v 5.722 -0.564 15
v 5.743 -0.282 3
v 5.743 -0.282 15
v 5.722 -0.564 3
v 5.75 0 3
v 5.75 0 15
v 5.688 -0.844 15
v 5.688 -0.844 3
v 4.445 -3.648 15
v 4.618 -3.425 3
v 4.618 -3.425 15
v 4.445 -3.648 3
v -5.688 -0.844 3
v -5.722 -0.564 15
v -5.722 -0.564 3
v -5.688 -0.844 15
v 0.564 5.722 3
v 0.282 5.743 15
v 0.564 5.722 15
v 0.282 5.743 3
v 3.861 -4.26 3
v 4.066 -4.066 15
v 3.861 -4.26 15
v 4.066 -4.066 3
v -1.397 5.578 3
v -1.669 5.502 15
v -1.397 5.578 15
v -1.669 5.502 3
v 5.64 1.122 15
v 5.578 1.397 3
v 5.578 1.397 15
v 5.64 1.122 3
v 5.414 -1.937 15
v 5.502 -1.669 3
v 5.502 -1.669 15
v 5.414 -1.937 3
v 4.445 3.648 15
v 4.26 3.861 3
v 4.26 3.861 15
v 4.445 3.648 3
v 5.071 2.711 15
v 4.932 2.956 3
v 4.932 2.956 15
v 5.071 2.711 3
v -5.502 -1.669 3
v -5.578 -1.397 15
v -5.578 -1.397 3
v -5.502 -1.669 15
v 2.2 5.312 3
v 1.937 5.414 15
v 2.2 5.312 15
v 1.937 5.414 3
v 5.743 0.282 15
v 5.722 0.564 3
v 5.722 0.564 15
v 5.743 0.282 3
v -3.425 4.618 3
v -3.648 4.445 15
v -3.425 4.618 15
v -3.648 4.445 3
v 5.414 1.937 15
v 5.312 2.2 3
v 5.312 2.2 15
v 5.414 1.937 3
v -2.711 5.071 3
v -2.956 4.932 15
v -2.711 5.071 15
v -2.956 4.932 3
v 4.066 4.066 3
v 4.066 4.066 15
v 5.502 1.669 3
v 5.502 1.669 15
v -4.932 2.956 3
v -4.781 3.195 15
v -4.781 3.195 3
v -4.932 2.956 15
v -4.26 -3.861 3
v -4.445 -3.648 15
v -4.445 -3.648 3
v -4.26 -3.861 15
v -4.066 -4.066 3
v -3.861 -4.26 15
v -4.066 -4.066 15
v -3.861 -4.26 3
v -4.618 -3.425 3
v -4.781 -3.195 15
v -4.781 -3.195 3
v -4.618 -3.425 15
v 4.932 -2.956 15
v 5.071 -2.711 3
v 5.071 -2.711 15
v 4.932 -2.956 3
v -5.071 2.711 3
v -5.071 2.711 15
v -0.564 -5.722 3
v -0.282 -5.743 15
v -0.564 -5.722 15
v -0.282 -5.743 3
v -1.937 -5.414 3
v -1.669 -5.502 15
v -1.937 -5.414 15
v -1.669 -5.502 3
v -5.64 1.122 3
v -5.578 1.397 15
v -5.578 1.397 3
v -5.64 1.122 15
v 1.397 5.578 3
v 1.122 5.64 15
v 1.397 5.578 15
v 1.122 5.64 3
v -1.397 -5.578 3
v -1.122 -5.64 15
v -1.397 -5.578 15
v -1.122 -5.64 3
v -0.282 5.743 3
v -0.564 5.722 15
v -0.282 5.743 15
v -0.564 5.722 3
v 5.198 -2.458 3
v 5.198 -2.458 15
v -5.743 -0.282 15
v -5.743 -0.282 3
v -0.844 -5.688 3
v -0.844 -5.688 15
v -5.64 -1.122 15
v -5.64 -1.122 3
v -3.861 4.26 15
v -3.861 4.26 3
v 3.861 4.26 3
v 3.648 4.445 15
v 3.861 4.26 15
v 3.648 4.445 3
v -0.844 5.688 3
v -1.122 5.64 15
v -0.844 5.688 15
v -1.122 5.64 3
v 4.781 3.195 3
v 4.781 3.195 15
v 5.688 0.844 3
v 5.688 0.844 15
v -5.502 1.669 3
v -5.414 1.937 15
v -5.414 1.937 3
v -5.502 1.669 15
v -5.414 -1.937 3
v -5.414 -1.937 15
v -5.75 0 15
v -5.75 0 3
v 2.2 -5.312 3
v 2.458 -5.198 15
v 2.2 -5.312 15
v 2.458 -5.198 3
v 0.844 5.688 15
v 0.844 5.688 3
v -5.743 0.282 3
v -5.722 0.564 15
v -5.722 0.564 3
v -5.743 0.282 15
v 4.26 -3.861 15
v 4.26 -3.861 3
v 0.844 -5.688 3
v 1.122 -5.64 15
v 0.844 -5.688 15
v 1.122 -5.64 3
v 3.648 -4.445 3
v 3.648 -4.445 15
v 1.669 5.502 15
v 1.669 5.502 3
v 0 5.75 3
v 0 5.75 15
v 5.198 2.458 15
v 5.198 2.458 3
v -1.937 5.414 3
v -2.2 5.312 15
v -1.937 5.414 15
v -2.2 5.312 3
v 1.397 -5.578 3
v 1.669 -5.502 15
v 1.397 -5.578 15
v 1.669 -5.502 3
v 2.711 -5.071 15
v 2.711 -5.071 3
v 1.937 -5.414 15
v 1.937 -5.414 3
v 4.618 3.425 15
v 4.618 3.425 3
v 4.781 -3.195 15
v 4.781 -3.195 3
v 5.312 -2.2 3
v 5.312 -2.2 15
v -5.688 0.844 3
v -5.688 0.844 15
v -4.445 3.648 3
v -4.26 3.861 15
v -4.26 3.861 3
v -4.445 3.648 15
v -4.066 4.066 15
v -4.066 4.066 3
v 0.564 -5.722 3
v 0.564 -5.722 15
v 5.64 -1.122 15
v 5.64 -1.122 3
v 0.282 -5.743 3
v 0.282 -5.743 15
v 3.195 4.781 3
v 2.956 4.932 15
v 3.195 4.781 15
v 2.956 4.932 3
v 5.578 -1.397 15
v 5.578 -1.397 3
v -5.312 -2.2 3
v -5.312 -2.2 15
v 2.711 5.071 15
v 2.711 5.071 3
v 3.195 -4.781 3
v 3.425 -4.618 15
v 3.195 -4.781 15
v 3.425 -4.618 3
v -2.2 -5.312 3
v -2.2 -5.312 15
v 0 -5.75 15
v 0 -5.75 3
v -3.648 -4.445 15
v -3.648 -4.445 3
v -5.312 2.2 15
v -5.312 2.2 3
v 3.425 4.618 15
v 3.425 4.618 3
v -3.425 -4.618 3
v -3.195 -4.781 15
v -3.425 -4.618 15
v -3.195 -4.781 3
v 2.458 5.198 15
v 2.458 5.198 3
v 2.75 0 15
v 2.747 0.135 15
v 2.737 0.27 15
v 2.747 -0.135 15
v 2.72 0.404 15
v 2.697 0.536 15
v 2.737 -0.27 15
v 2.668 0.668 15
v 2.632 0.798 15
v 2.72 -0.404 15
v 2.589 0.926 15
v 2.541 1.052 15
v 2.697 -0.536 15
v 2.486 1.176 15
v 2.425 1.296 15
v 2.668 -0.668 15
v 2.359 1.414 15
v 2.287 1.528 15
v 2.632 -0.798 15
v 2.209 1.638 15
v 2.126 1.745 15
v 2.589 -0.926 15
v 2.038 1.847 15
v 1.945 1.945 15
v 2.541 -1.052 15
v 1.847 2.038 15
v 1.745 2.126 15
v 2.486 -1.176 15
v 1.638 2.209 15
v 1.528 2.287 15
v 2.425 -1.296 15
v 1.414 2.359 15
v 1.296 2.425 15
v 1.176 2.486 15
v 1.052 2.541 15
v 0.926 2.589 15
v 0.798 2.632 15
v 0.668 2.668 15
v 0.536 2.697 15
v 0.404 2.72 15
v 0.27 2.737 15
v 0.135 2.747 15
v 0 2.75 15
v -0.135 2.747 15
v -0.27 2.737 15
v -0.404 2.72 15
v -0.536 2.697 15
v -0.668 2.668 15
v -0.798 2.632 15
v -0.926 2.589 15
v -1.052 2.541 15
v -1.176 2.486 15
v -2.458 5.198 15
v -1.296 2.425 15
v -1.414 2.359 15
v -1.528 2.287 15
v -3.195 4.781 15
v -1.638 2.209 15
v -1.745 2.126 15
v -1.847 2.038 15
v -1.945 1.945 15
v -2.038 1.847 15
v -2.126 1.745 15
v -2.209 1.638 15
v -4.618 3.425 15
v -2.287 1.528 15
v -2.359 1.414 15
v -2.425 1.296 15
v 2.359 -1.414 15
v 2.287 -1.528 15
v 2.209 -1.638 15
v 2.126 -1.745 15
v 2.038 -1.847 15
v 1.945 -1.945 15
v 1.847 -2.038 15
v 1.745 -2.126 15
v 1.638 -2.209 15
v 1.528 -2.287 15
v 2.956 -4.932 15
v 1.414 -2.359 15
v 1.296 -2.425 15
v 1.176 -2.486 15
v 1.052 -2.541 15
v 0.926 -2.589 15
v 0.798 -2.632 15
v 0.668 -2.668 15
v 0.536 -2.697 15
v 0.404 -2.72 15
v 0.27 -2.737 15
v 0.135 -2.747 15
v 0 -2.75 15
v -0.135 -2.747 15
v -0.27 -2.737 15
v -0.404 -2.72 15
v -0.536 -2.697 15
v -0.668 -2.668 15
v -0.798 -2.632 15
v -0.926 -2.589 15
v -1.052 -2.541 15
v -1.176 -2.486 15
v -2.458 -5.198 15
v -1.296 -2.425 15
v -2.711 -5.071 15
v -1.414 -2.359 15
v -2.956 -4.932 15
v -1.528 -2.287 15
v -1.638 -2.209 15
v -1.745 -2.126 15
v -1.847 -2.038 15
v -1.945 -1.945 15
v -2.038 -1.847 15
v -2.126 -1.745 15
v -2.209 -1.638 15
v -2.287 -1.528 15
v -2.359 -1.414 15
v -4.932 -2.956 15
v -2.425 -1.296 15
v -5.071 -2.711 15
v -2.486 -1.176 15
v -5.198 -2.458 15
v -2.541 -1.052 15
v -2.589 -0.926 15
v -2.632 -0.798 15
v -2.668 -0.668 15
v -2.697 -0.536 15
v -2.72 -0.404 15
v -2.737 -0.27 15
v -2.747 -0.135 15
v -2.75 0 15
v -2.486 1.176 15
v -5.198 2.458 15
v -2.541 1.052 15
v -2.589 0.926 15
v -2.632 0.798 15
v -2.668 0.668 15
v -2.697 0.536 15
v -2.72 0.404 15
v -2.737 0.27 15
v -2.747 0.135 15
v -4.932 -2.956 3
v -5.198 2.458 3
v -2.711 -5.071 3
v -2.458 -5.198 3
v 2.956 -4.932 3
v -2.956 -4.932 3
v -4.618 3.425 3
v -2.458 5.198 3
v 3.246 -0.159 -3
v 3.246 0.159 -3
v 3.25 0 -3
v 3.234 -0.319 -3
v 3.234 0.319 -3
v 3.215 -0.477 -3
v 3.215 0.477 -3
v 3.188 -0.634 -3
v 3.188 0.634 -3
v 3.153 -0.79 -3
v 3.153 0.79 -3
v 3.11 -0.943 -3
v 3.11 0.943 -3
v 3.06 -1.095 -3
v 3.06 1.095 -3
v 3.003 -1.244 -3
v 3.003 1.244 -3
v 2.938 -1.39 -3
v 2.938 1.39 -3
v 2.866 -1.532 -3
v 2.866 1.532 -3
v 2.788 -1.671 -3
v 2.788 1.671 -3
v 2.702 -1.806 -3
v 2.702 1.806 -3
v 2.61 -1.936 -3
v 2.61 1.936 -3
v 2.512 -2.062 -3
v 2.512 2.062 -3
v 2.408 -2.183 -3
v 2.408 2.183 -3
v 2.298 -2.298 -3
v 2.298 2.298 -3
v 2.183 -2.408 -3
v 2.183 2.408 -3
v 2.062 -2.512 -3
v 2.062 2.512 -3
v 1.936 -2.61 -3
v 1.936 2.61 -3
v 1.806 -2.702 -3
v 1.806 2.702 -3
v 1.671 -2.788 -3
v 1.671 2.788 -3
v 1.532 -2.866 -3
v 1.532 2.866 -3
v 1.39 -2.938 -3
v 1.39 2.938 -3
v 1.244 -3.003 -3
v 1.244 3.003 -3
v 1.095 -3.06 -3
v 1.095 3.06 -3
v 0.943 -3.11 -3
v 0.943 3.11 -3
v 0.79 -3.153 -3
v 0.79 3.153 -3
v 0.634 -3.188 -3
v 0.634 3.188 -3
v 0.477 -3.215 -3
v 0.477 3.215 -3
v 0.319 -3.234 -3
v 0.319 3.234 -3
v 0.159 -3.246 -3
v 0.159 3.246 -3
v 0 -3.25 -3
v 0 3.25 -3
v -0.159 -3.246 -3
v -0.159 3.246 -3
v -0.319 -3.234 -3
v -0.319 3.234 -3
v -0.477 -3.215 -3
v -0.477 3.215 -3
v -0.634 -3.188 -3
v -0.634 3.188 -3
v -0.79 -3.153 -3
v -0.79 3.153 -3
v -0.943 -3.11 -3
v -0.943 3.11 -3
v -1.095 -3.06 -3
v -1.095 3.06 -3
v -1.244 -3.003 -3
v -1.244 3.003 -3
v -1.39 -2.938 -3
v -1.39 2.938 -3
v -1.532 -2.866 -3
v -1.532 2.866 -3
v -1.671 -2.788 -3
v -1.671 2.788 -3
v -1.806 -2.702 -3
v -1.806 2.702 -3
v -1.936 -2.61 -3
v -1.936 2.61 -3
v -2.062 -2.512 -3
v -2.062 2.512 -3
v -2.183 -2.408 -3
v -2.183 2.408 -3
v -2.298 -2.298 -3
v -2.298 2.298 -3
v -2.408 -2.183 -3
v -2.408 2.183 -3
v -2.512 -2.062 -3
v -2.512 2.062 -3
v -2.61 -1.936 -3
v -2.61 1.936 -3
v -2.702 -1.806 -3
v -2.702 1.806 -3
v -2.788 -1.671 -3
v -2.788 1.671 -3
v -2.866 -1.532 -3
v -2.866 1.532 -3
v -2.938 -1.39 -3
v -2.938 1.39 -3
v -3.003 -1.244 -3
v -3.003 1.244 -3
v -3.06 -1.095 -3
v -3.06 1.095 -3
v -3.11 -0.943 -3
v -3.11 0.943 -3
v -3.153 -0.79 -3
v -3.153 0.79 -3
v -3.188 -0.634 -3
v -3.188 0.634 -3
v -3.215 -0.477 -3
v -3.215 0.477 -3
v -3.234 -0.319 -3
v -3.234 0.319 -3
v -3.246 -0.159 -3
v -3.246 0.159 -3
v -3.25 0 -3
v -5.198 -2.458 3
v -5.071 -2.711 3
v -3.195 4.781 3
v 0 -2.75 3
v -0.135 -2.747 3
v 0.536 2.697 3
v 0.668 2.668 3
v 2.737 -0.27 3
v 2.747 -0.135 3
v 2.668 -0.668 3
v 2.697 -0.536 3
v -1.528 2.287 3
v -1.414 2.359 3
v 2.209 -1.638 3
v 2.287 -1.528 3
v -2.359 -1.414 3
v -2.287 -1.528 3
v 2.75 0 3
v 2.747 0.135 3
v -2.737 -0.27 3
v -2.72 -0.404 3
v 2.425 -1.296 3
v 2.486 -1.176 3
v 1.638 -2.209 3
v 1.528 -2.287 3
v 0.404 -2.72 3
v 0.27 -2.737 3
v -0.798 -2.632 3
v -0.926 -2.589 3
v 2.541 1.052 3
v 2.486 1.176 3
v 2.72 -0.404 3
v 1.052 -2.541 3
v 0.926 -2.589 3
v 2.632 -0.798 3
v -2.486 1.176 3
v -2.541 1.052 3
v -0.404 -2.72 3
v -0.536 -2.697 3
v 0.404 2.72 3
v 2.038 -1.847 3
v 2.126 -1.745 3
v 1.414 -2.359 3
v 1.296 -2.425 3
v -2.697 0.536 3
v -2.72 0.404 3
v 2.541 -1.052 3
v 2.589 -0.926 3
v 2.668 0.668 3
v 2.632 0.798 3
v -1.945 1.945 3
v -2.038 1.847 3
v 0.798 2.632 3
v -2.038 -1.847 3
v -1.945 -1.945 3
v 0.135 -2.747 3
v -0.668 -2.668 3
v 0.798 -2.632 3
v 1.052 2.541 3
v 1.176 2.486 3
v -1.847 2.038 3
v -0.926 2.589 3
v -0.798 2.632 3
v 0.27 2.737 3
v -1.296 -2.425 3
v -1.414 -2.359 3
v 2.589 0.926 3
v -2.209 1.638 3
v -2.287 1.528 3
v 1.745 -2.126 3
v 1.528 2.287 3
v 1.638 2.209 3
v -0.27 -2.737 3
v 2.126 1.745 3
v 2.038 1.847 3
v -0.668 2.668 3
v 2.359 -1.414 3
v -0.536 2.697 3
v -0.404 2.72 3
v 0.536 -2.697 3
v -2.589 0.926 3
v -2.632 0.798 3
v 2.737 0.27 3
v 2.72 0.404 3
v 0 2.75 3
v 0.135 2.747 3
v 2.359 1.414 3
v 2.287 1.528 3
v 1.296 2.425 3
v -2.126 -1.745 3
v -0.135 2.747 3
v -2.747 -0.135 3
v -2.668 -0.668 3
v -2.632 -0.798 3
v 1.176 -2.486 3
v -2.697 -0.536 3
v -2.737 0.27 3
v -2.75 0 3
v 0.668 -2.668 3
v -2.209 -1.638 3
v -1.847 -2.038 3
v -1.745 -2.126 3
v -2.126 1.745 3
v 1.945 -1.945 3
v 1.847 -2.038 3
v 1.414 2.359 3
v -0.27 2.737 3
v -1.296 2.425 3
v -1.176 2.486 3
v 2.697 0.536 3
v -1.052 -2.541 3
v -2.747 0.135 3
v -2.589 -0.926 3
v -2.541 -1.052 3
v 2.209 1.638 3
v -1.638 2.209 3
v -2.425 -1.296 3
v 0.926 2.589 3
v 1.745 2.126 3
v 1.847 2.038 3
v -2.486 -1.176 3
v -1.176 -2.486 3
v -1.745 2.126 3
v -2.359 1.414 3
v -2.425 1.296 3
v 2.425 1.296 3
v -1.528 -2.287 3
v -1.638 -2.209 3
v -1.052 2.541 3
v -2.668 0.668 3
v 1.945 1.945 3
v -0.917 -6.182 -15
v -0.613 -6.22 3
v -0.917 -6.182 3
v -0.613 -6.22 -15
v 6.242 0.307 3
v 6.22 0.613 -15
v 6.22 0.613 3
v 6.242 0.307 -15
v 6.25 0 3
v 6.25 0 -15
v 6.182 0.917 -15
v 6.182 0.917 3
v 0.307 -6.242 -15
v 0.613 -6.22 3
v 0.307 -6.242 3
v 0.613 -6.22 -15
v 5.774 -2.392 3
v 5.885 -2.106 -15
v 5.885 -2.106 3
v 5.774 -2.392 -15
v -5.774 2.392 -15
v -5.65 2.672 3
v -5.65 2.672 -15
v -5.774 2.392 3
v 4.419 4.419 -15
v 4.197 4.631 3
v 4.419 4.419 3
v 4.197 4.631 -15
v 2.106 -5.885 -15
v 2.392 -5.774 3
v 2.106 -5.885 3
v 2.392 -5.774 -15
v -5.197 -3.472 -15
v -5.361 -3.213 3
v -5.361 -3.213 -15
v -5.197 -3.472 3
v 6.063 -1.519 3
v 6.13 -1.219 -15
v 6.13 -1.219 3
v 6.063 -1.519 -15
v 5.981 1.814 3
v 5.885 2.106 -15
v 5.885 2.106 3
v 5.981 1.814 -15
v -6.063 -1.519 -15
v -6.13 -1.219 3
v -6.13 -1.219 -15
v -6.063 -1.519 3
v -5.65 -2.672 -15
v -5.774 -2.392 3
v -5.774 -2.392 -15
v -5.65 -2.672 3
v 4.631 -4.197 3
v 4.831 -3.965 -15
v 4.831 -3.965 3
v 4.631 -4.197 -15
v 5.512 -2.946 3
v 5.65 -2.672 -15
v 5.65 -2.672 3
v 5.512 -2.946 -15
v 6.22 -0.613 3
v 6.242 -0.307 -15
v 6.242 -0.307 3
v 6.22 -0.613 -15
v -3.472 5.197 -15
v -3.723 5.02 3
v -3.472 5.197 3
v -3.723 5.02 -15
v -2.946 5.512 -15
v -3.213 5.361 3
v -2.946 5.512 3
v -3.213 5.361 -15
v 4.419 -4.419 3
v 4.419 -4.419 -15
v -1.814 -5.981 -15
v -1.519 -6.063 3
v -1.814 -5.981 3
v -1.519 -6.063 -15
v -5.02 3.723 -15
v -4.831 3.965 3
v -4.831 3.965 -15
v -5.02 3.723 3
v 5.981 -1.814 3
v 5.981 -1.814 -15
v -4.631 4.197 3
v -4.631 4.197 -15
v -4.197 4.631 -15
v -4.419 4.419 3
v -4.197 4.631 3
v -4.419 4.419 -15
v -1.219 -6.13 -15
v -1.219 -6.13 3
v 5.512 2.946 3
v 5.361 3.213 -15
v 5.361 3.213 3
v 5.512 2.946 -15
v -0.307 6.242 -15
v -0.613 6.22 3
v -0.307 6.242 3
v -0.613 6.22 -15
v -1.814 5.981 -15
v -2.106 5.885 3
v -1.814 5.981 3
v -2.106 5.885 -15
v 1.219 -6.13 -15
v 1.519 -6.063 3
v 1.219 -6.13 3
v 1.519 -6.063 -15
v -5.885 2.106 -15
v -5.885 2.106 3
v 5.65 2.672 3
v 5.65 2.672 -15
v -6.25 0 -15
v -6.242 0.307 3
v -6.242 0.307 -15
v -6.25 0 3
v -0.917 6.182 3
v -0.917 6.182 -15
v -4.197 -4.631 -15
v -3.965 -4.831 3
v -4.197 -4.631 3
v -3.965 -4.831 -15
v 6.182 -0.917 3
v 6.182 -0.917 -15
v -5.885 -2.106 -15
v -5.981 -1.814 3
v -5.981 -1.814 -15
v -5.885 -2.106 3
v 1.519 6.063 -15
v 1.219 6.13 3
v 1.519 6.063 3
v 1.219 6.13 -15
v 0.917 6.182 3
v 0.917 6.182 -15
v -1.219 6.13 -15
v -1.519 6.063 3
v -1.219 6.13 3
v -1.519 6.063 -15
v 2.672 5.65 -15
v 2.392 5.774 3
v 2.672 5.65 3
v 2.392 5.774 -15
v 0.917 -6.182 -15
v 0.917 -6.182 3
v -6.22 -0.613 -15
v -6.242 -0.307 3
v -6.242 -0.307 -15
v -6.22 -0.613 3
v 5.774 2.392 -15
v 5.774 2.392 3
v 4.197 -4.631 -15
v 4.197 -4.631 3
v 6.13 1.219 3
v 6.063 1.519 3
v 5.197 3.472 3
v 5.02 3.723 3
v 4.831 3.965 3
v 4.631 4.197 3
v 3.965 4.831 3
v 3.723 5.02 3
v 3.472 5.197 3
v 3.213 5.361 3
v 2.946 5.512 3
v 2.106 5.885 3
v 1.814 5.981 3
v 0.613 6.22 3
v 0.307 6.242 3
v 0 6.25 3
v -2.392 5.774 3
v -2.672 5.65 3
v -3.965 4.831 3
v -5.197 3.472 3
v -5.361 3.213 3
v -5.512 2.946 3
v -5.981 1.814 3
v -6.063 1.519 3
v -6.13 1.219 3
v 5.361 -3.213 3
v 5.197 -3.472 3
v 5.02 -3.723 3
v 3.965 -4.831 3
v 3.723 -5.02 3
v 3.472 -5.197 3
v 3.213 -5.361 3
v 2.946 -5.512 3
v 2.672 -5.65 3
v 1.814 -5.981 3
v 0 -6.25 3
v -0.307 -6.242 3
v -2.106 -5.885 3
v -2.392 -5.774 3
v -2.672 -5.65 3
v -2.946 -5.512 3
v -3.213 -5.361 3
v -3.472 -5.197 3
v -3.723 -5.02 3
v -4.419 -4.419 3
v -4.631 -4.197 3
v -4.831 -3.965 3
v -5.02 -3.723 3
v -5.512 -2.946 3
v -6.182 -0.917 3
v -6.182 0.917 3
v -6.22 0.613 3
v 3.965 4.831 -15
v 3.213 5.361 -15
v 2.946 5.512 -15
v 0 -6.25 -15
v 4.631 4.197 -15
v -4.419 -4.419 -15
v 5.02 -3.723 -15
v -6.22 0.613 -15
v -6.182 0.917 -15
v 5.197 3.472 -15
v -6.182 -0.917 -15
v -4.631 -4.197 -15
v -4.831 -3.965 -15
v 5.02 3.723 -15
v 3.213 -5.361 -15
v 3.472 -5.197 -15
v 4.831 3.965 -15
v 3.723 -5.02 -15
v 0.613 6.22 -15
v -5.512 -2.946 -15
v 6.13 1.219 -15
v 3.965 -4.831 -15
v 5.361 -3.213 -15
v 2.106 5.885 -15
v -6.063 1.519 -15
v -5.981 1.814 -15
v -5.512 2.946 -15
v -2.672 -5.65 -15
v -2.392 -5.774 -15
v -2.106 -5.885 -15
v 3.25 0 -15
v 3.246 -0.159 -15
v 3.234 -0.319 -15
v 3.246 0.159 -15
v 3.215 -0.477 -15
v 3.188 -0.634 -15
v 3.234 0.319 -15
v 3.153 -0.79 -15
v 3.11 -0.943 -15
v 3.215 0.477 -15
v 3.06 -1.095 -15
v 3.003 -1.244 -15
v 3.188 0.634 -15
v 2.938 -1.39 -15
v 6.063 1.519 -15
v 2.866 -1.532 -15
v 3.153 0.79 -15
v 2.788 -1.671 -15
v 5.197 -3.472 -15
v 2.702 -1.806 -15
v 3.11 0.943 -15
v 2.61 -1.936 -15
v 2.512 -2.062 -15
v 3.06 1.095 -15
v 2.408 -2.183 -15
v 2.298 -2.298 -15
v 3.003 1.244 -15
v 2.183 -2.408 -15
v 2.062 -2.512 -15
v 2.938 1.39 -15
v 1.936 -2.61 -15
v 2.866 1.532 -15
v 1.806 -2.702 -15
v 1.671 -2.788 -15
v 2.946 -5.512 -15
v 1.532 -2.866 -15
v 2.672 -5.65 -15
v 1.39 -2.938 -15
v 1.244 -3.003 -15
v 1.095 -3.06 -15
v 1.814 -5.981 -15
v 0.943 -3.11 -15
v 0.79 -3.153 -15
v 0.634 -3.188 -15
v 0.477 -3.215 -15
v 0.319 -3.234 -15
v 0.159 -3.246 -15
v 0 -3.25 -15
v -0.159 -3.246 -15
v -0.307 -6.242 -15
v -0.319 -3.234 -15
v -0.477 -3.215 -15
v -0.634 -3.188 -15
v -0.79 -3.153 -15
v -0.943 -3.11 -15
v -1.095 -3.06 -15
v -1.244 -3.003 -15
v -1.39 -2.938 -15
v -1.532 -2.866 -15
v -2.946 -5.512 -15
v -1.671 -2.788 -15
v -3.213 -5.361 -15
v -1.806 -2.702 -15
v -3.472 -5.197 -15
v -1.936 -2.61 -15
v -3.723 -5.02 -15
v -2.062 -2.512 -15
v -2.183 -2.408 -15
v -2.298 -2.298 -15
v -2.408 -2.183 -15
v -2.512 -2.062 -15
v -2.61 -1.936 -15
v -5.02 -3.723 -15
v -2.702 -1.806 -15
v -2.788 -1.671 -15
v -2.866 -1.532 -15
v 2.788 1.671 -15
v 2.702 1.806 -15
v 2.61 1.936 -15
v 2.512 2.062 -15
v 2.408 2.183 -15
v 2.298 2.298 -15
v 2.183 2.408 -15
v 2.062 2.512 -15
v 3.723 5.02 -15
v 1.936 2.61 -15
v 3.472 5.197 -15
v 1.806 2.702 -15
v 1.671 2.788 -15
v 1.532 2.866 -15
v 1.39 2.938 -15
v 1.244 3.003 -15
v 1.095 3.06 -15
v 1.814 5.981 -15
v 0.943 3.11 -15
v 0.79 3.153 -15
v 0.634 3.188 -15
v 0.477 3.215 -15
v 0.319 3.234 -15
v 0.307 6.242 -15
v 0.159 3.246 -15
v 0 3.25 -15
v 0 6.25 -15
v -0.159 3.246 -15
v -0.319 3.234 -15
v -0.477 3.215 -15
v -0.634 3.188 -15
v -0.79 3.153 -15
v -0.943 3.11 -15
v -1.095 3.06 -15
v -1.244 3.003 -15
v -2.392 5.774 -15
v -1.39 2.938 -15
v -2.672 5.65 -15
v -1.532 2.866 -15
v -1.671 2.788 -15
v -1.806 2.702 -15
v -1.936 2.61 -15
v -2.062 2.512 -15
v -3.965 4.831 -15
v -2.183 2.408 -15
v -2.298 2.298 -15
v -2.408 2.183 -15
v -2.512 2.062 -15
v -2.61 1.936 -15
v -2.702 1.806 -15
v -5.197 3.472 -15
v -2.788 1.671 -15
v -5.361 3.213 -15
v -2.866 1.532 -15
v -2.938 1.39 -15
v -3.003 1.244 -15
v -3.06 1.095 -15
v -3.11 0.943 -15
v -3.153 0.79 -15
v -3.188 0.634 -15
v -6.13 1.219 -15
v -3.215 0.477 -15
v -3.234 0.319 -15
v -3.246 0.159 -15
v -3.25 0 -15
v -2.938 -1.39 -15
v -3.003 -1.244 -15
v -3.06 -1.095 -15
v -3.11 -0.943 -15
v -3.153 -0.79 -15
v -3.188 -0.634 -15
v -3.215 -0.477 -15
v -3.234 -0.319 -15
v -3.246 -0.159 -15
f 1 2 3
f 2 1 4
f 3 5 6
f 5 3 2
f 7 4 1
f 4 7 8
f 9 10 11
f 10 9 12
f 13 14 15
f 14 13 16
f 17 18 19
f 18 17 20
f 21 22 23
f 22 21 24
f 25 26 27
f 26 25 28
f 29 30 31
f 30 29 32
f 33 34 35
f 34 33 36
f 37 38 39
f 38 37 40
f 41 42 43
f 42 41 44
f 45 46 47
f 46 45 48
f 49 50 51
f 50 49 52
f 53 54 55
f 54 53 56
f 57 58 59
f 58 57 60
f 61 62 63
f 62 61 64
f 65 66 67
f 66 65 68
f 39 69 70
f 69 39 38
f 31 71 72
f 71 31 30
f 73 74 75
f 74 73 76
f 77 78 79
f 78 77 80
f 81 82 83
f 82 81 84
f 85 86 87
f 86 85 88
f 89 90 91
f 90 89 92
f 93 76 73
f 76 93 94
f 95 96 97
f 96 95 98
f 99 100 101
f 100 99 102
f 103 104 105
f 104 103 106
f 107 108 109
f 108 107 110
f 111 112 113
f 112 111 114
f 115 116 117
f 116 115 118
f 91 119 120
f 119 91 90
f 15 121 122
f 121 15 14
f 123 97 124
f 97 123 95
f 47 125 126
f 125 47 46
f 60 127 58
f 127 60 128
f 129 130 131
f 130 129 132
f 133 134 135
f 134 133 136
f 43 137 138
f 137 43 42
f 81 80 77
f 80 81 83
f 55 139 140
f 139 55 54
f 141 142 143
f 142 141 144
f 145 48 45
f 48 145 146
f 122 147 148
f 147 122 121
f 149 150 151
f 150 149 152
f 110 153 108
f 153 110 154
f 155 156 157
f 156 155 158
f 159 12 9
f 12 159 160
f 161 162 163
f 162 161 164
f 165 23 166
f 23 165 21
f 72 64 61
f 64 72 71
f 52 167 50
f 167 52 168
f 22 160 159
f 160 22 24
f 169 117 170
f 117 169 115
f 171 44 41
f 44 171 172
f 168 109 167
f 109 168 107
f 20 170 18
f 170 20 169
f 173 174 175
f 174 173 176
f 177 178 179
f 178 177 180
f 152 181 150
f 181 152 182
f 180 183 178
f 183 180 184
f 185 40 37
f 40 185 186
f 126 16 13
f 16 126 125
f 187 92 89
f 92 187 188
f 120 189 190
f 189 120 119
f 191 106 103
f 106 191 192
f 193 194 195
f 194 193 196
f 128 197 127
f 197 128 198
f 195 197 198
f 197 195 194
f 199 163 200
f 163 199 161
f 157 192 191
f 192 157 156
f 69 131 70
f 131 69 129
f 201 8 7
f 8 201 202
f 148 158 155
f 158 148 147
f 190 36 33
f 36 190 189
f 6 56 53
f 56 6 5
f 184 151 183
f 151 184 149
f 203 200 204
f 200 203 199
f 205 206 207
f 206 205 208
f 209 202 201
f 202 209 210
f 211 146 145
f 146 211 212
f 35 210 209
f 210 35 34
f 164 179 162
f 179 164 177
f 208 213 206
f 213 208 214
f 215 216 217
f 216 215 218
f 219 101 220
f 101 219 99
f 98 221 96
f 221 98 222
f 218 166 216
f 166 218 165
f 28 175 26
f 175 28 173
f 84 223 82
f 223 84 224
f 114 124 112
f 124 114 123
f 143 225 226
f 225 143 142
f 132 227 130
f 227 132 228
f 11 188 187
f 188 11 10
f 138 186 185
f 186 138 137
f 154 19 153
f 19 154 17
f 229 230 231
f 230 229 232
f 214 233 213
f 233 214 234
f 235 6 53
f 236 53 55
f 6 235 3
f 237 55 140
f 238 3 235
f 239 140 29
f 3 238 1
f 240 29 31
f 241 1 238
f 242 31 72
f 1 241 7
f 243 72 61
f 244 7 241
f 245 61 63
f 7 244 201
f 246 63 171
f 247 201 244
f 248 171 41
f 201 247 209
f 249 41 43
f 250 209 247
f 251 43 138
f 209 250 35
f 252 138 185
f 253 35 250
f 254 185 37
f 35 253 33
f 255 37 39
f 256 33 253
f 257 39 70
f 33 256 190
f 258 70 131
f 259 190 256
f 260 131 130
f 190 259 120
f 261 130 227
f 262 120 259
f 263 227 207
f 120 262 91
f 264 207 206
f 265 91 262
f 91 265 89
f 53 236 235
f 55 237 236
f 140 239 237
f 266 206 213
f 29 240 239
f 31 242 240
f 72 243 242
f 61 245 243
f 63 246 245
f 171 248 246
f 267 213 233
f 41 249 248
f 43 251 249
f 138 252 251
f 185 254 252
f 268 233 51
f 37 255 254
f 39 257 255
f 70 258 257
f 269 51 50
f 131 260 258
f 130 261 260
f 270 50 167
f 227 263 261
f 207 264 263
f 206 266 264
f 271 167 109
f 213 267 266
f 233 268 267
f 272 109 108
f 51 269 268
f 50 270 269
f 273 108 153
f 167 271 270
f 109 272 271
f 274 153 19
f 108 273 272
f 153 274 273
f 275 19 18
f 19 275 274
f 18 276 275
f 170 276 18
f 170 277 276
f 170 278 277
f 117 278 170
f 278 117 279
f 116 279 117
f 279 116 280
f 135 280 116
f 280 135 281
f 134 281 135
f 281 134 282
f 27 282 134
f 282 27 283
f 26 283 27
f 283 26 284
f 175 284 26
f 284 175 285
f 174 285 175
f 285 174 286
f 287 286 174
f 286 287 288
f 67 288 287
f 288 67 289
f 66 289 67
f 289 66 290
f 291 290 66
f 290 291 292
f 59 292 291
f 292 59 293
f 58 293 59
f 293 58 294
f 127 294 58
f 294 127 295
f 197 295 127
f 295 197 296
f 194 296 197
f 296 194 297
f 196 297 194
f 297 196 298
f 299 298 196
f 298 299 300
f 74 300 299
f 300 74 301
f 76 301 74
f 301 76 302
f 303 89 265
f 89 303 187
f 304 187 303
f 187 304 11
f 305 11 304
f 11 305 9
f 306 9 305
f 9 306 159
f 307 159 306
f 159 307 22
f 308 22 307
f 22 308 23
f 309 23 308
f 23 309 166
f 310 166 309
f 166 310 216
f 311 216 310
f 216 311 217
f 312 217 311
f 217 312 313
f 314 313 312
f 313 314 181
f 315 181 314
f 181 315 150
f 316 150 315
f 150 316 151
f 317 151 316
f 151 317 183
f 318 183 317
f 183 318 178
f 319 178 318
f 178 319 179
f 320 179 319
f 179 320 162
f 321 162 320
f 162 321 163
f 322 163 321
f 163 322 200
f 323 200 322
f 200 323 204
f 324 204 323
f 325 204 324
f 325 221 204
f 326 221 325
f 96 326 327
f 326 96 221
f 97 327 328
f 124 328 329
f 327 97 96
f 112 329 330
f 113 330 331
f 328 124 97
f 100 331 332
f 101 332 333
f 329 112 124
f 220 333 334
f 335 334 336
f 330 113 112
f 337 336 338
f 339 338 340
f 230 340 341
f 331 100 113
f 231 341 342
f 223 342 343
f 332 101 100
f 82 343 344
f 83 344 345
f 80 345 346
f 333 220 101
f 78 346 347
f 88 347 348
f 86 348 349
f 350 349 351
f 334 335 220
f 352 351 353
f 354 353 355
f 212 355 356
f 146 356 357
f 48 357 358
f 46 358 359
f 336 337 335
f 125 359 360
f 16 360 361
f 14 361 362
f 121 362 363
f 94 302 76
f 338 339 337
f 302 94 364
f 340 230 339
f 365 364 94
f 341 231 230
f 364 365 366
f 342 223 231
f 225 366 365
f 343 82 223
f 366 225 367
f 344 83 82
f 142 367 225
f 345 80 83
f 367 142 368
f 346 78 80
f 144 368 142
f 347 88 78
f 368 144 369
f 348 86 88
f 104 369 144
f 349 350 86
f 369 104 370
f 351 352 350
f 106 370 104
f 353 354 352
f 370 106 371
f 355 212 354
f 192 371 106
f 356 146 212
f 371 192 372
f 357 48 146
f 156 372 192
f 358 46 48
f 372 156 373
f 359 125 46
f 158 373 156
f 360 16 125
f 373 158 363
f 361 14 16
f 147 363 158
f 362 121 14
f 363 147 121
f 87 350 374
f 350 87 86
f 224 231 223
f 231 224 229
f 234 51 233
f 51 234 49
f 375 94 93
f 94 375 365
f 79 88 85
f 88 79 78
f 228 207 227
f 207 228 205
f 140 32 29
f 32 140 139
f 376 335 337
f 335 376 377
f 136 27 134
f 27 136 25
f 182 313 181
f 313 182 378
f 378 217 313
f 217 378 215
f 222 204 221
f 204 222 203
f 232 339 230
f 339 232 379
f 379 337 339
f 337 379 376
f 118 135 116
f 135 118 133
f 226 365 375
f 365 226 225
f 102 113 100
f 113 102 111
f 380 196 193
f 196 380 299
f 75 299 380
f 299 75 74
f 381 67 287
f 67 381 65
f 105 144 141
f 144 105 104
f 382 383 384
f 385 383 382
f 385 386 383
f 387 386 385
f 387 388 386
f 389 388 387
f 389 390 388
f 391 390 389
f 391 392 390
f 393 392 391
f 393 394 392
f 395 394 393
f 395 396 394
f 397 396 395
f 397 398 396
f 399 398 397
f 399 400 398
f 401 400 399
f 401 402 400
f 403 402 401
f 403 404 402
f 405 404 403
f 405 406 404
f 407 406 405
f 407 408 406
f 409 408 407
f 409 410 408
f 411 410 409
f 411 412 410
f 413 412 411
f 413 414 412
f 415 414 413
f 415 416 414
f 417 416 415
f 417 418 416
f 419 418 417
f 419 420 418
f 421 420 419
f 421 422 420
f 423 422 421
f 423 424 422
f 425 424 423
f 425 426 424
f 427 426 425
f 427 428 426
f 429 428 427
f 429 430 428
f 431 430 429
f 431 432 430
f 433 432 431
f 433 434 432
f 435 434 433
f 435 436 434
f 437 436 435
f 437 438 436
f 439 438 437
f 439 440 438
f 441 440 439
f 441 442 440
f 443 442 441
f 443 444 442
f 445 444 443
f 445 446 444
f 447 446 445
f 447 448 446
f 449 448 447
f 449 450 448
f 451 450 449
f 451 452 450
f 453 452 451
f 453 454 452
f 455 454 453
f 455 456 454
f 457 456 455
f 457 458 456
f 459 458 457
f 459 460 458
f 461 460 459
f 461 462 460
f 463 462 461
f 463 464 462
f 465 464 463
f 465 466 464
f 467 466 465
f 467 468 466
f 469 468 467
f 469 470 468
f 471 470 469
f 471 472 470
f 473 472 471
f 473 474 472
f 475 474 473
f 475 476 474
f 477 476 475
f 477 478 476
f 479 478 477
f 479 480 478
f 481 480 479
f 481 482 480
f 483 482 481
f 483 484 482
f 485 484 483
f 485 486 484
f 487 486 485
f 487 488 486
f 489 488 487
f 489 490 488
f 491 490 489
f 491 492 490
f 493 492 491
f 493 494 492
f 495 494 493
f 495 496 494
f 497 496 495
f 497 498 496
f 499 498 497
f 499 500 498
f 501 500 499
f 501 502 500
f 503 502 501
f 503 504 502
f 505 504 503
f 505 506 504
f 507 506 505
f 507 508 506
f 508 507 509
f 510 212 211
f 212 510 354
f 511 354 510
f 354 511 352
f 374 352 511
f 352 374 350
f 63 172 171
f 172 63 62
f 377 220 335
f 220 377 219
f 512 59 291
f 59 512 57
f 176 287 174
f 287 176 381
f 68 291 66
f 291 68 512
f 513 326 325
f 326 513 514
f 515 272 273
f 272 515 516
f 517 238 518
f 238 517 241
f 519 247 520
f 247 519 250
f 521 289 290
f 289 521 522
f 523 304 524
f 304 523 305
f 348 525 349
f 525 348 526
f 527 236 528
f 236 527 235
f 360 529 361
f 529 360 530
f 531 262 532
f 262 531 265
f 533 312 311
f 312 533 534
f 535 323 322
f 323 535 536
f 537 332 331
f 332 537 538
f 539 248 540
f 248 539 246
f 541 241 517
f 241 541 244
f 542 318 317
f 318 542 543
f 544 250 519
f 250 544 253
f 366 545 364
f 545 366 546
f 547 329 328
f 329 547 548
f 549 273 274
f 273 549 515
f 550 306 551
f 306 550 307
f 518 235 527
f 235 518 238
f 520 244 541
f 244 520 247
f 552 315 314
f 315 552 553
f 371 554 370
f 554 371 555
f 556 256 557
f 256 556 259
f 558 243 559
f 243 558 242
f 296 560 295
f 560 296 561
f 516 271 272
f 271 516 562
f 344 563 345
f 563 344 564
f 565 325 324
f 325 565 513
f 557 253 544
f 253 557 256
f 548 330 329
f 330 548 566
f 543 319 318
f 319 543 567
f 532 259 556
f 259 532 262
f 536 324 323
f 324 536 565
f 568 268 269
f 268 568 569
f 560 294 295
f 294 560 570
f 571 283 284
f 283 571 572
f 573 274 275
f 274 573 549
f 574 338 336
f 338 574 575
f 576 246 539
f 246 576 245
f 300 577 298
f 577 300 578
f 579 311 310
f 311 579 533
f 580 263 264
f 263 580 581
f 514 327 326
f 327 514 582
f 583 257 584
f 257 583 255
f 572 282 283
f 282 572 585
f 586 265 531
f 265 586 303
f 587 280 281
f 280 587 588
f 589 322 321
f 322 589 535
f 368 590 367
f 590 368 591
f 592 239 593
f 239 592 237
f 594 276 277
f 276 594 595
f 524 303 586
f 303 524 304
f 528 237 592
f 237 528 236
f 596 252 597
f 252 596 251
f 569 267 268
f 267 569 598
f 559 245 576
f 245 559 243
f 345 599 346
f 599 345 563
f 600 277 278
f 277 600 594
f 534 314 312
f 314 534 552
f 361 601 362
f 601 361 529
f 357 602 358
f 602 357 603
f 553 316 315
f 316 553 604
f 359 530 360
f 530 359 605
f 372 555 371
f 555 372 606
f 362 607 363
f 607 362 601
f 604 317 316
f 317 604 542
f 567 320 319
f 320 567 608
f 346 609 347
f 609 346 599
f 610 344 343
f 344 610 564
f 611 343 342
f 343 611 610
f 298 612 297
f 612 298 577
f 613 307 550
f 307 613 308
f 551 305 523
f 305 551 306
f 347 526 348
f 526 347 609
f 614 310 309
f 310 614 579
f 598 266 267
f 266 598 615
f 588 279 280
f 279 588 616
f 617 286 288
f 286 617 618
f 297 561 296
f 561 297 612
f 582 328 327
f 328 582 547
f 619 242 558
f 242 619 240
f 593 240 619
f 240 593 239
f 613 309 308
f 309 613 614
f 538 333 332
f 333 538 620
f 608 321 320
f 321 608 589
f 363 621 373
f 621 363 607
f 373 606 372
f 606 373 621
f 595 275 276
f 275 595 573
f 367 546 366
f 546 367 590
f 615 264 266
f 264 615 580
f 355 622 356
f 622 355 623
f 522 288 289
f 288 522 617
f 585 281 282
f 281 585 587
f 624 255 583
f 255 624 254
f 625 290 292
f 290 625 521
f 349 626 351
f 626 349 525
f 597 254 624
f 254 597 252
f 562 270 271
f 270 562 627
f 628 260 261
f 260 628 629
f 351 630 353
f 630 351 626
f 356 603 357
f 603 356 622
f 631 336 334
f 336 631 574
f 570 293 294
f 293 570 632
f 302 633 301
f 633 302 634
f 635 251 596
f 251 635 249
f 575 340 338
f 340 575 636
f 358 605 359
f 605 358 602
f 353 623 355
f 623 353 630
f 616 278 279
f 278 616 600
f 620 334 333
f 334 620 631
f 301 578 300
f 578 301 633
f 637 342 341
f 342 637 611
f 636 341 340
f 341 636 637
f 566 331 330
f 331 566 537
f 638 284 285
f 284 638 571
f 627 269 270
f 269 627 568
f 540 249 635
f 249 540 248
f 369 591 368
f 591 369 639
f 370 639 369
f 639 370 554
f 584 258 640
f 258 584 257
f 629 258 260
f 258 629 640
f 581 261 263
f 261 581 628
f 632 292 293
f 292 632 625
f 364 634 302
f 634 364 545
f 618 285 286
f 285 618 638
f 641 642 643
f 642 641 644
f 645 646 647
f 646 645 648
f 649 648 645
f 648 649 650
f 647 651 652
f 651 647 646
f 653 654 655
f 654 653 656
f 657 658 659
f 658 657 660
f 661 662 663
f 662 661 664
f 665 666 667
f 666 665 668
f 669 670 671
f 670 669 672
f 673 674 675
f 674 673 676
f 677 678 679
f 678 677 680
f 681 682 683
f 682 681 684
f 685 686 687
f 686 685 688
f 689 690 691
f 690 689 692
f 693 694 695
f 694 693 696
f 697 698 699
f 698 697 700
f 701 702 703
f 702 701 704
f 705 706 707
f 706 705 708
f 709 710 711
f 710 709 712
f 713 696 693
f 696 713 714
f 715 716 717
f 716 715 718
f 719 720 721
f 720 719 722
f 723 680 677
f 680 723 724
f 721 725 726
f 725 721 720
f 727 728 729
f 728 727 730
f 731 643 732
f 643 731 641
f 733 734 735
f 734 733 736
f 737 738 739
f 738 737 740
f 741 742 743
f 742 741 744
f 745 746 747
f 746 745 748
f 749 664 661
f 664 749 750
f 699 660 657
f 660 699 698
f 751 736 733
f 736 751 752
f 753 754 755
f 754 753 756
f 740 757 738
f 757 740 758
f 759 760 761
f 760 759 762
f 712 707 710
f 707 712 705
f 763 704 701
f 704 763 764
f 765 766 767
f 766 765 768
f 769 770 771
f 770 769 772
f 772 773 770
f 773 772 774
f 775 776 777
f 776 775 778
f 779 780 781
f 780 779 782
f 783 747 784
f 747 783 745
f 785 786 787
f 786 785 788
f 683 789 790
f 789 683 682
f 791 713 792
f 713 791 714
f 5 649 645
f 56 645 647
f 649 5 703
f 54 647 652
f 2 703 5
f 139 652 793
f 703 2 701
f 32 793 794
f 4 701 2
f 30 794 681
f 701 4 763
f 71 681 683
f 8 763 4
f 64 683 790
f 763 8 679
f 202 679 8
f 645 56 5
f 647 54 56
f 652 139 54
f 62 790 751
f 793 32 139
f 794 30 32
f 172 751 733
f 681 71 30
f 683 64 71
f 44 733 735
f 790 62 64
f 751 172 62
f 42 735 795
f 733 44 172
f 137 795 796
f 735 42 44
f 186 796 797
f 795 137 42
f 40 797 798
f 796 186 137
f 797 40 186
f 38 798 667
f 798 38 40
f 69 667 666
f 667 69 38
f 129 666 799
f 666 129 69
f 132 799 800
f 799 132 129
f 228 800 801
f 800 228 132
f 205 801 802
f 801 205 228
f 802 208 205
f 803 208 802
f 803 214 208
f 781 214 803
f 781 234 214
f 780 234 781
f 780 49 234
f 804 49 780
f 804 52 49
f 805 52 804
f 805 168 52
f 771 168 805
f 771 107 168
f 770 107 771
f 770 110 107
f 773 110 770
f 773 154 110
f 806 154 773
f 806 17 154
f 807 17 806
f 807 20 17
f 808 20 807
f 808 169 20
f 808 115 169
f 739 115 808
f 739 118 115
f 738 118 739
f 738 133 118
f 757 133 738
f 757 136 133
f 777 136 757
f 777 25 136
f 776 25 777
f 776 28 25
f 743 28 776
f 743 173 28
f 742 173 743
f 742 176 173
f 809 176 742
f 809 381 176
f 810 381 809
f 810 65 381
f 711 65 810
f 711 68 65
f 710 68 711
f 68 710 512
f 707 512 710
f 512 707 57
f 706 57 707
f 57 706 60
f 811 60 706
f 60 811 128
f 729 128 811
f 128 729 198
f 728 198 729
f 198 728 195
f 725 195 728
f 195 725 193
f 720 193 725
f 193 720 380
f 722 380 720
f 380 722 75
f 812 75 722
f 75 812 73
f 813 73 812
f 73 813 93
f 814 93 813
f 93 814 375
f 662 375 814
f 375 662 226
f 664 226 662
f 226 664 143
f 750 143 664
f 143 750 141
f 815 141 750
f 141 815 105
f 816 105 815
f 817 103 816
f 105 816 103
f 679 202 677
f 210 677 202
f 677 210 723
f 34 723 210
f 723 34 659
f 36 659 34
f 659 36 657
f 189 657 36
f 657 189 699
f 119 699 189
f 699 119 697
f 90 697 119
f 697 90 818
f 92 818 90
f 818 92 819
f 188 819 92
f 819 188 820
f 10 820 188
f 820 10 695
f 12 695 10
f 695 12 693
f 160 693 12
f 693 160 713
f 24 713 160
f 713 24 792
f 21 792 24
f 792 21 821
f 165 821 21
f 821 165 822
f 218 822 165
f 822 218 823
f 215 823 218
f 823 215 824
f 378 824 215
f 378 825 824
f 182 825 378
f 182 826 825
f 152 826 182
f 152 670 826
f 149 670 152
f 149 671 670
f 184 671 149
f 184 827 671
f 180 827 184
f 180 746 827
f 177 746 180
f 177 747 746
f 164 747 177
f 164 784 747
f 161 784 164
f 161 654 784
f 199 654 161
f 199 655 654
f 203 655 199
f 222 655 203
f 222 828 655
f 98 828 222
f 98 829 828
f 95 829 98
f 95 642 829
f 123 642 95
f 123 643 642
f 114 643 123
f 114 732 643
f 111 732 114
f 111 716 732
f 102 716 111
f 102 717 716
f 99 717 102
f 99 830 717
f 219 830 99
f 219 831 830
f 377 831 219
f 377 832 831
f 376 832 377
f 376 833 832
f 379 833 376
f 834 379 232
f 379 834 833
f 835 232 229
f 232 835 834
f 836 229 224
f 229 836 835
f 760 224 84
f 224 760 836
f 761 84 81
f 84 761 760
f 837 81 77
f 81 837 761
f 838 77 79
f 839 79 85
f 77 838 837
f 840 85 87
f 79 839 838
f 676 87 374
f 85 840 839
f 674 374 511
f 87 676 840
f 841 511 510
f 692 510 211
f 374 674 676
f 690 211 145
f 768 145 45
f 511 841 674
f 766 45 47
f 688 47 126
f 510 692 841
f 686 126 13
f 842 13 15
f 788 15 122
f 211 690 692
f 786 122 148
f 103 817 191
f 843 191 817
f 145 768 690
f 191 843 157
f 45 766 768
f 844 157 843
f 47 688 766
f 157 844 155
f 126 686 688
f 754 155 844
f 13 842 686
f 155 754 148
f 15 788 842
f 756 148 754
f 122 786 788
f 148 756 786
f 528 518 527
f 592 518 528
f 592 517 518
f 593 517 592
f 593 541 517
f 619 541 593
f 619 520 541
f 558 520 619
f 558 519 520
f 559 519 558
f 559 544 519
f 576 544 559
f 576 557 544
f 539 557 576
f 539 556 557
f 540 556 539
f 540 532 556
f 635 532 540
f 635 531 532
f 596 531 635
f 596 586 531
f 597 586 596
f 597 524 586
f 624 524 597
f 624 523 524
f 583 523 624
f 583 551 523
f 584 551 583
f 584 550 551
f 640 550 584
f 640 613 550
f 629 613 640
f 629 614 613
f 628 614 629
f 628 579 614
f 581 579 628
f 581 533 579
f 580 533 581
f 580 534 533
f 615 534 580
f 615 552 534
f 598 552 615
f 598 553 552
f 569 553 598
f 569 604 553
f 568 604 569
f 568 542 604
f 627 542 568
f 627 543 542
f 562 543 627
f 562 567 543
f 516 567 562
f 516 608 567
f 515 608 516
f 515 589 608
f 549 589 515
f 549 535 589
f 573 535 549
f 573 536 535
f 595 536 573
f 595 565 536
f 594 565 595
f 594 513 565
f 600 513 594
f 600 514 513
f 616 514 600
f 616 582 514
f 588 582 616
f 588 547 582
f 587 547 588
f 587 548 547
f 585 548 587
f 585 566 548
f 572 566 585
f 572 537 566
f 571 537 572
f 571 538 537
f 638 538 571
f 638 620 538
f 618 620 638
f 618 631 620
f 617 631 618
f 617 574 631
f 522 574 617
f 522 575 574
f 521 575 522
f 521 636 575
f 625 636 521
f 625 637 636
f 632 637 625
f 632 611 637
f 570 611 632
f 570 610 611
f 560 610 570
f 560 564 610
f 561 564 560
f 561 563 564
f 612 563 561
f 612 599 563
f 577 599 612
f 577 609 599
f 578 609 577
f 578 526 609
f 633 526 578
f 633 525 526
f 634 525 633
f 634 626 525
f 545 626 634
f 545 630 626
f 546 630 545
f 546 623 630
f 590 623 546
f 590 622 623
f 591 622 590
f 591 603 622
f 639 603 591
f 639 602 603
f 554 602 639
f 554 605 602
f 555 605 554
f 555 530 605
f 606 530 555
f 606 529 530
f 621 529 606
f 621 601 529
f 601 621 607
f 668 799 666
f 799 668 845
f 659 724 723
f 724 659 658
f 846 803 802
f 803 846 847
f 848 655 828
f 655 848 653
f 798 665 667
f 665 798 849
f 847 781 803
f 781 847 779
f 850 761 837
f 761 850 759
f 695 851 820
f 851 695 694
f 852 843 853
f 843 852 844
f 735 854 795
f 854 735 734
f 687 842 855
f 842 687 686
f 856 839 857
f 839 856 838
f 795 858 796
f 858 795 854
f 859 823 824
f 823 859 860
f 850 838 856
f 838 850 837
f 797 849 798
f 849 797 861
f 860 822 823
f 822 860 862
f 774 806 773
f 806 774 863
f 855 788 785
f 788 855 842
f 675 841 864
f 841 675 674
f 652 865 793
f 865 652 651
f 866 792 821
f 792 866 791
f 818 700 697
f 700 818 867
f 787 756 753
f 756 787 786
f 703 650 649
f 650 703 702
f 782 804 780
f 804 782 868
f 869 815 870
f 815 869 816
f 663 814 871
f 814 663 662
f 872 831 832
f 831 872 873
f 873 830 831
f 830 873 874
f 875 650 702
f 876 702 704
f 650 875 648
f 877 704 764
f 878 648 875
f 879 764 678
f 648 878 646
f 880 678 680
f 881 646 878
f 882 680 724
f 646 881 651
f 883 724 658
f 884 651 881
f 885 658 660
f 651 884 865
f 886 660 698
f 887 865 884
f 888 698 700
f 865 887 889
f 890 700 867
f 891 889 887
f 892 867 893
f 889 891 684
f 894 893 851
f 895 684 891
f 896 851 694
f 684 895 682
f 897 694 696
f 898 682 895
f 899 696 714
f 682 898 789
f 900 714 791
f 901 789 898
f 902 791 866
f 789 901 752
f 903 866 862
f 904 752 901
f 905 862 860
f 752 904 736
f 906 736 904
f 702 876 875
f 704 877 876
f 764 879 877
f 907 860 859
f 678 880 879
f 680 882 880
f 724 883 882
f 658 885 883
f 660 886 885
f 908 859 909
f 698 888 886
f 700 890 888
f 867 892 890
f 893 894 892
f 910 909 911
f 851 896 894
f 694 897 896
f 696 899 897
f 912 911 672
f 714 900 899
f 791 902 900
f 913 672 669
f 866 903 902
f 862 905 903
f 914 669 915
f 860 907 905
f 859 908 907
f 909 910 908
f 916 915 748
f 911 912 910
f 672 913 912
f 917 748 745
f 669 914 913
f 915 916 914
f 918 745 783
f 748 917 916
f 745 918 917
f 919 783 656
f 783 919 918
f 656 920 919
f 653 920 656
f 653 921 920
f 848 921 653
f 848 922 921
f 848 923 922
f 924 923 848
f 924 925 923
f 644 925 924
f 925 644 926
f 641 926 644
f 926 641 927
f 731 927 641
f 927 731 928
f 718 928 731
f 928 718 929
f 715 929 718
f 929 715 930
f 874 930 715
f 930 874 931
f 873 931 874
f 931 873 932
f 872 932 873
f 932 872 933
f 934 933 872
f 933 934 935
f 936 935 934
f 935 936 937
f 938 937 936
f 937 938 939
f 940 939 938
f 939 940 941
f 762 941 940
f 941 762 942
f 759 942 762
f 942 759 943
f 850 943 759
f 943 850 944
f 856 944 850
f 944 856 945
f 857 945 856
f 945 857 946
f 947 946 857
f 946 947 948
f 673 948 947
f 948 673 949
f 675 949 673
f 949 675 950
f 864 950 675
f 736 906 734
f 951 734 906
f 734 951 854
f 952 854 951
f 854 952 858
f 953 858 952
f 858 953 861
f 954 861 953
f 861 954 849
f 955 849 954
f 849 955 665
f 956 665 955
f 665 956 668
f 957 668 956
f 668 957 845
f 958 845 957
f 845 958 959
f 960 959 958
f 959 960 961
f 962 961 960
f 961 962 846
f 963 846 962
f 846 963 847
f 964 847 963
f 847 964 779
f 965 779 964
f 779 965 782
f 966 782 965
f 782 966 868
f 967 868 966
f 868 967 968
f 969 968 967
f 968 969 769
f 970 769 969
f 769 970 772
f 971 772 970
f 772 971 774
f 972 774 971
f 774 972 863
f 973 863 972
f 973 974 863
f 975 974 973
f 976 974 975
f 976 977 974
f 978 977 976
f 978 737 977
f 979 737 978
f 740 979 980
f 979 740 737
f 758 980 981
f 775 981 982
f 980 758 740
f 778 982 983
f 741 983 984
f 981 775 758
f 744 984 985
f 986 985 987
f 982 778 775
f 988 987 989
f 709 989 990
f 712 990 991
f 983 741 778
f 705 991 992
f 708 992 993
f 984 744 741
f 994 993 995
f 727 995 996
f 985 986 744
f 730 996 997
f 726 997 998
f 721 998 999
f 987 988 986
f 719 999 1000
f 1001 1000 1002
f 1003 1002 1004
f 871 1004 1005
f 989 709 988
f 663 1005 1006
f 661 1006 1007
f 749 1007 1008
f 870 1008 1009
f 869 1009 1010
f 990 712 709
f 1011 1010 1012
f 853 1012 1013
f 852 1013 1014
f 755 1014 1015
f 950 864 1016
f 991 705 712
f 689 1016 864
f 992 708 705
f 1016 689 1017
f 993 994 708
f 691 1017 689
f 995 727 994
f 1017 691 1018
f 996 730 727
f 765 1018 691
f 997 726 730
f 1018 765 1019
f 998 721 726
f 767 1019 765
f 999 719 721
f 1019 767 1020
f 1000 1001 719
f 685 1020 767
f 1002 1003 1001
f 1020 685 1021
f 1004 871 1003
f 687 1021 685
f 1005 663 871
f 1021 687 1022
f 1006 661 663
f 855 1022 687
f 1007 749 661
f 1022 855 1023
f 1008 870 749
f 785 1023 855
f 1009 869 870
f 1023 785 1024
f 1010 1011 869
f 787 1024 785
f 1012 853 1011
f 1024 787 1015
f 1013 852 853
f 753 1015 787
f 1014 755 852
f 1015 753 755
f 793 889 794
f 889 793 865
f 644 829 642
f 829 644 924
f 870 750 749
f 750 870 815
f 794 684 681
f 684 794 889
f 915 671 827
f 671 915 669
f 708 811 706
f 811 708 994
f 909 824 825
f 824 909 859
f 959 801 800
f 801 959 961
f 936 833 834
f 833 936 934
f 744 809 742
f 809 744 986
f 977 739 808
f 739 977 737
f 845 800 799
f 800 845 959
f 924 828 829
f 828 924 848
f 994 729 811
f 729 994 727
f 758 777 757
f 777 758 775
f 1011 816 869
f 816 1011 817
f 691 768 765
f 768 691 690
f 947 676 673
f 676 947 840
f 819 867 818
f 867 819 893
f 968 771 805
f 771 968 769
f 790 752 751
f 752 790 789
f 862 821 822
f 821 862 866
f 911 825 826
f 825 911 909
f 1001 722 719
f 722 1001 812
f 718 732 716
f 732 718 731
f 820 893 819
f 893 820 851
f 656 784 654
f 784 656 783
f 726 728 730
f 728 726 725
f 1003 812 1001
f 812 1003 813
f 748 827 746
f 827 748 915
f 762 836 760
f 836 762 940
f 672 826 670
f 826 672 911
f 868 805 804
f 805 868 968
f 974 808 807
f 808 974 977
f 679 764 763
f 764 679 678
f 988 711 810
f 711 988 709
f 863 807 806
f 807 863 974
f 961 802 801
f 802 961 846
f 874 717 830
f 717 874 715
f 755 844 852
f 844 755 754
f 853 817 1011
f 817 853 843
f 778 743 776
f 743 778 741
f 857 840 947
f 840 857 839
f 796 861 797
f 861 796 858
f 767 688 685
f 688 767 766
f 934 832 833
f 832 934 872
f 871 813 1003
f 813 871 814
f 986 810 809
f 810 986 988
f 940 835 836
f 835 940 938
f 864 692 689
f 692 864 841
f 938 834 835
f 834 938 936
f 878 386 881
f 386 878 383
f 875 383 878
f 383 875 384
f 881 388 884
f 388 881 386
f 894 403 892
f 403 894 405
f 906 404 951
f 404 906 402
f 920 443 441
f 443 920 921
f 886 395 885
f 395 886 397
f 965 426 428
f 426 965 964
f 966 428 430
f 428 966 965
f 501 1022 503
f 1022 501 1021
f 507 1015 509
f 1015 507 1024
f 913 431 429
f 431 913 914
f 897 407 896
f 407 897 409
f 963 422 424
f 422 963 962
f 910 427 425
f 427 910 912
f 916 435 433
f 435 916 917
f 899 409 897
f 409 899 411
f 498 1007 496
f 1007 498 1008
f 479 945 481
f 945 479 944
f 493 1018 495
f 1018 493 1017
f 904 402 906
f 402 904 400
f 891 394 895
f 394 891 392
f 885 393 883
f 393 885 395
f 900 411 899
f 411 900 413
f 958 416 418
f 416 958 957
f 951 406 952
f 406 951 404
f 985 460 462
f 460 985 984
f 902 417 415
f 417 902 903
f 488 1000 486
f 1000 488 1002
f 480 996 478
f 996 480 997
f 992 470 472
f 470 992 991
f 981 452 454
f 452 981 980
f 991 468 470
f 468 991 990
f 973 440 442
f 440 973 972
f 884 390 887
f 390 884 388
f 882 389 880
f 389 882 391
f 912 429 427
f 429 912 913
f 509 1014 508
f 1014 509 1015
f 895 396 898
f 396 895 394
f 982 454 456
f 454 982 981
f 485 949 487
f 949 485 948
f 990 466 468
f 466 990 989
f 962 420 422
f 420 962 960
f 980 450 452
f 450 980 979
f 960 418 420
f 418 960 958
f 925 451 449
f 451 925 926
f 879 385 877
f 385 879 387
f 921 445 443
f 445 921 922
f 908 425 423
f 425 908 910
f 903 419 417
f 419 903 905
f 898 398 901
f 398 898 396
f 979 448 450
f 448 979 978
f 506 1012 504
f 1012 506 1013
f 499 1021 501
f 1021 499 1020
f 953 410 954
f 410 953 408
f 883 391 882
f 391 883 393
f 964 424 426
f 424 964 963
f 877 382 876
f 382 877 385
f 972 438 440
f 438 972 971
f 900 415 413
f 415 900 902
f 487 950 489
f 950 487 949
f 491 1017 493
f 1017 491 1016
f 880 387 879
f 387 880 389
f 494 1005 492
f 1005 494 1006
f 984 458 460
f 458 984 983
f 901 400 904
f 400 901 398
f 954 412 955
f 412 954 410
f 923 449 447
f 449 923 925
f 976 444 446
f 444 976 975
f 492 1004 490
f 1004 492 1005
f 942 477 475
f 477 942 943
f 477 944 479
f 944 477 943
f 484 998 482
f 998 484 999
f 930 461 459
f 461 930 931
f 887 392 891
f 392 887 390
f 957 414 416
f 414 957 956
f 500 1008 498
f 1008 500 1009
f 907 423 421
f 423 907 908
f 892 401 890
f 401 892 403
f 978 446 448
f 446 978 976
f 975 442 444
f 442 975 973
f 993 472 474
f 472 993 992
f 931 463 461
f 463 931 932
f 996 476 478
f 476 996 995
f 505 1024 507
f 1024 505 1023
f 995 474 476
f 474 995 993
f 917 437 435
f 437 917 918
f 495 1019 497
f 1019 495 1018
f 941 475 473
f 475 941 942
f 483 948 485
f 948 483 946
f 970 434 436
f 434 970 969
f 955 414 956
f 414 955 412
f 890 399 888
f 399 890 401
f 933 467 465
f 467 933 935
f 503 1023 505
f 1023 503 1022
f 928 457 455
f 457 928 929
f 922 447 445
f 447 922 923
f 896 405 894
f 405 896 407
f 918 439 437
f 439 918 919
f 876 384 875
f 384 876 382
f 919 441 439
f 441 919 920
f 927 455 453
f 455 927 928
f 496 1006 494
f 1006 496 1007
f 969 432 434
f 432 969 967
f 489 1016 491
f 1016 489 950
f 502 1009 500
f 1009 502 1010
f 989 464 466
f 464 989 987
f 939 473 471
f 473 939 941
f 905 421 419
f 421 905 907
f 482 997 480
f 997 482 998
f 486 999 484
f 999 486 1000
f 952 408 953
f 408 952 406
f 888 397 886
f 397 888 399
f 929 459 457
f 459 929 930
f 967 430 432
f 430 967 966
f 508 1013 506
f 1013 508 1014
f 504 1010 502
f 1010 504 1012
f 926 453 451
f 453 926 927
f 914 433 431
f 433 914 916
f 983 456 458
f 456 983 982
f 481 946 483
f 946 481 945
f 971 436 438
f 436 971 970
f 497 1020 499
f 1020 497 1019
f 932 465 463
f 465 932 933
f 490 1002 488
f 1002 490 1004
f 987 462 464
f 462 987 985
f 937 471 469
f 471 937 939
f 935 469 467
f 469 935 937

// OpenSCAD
expansion_fudge = 0.5;
motor_coupler_length = 15;
motor_shaft_radius = (5 + expansion_fudge) / 2.0;

drive_shaft_length = 15;
drive_shaft_radius = (6 + expansion_fudge) / 2.0;

thickness = 3;

fn = 128;


module coupler(shaft_length, shaft_radius, thickness) {
  difference() {
    cylinder(h = shaft_length + thickness,
             r1 = shaft_radius + thickness,
             r2 = shaft_radius + thickness, $fn=fn);
    cylinder(h = shaft_length,
             r1 = shaft_radius,
             r2 = shaft_radius, $fn=fn);
  }
}

module render()
{
  rotate(a=180, v=[1,0,0]) {
    translate([0, 0, -motor_coupler_length]) {
      coupler(motor_coupler_length,
              motor_shaft_radius,
              thickness);
    }
    rotate(a=180, v=[1,0,0])
    translate([0, 0, -(drive_shaft_length)])
    {
      coupler(drive_shaft_length,
              drive_shaft_radius,
              thickness);
    }
  }
}

echo(version=version());

render();
